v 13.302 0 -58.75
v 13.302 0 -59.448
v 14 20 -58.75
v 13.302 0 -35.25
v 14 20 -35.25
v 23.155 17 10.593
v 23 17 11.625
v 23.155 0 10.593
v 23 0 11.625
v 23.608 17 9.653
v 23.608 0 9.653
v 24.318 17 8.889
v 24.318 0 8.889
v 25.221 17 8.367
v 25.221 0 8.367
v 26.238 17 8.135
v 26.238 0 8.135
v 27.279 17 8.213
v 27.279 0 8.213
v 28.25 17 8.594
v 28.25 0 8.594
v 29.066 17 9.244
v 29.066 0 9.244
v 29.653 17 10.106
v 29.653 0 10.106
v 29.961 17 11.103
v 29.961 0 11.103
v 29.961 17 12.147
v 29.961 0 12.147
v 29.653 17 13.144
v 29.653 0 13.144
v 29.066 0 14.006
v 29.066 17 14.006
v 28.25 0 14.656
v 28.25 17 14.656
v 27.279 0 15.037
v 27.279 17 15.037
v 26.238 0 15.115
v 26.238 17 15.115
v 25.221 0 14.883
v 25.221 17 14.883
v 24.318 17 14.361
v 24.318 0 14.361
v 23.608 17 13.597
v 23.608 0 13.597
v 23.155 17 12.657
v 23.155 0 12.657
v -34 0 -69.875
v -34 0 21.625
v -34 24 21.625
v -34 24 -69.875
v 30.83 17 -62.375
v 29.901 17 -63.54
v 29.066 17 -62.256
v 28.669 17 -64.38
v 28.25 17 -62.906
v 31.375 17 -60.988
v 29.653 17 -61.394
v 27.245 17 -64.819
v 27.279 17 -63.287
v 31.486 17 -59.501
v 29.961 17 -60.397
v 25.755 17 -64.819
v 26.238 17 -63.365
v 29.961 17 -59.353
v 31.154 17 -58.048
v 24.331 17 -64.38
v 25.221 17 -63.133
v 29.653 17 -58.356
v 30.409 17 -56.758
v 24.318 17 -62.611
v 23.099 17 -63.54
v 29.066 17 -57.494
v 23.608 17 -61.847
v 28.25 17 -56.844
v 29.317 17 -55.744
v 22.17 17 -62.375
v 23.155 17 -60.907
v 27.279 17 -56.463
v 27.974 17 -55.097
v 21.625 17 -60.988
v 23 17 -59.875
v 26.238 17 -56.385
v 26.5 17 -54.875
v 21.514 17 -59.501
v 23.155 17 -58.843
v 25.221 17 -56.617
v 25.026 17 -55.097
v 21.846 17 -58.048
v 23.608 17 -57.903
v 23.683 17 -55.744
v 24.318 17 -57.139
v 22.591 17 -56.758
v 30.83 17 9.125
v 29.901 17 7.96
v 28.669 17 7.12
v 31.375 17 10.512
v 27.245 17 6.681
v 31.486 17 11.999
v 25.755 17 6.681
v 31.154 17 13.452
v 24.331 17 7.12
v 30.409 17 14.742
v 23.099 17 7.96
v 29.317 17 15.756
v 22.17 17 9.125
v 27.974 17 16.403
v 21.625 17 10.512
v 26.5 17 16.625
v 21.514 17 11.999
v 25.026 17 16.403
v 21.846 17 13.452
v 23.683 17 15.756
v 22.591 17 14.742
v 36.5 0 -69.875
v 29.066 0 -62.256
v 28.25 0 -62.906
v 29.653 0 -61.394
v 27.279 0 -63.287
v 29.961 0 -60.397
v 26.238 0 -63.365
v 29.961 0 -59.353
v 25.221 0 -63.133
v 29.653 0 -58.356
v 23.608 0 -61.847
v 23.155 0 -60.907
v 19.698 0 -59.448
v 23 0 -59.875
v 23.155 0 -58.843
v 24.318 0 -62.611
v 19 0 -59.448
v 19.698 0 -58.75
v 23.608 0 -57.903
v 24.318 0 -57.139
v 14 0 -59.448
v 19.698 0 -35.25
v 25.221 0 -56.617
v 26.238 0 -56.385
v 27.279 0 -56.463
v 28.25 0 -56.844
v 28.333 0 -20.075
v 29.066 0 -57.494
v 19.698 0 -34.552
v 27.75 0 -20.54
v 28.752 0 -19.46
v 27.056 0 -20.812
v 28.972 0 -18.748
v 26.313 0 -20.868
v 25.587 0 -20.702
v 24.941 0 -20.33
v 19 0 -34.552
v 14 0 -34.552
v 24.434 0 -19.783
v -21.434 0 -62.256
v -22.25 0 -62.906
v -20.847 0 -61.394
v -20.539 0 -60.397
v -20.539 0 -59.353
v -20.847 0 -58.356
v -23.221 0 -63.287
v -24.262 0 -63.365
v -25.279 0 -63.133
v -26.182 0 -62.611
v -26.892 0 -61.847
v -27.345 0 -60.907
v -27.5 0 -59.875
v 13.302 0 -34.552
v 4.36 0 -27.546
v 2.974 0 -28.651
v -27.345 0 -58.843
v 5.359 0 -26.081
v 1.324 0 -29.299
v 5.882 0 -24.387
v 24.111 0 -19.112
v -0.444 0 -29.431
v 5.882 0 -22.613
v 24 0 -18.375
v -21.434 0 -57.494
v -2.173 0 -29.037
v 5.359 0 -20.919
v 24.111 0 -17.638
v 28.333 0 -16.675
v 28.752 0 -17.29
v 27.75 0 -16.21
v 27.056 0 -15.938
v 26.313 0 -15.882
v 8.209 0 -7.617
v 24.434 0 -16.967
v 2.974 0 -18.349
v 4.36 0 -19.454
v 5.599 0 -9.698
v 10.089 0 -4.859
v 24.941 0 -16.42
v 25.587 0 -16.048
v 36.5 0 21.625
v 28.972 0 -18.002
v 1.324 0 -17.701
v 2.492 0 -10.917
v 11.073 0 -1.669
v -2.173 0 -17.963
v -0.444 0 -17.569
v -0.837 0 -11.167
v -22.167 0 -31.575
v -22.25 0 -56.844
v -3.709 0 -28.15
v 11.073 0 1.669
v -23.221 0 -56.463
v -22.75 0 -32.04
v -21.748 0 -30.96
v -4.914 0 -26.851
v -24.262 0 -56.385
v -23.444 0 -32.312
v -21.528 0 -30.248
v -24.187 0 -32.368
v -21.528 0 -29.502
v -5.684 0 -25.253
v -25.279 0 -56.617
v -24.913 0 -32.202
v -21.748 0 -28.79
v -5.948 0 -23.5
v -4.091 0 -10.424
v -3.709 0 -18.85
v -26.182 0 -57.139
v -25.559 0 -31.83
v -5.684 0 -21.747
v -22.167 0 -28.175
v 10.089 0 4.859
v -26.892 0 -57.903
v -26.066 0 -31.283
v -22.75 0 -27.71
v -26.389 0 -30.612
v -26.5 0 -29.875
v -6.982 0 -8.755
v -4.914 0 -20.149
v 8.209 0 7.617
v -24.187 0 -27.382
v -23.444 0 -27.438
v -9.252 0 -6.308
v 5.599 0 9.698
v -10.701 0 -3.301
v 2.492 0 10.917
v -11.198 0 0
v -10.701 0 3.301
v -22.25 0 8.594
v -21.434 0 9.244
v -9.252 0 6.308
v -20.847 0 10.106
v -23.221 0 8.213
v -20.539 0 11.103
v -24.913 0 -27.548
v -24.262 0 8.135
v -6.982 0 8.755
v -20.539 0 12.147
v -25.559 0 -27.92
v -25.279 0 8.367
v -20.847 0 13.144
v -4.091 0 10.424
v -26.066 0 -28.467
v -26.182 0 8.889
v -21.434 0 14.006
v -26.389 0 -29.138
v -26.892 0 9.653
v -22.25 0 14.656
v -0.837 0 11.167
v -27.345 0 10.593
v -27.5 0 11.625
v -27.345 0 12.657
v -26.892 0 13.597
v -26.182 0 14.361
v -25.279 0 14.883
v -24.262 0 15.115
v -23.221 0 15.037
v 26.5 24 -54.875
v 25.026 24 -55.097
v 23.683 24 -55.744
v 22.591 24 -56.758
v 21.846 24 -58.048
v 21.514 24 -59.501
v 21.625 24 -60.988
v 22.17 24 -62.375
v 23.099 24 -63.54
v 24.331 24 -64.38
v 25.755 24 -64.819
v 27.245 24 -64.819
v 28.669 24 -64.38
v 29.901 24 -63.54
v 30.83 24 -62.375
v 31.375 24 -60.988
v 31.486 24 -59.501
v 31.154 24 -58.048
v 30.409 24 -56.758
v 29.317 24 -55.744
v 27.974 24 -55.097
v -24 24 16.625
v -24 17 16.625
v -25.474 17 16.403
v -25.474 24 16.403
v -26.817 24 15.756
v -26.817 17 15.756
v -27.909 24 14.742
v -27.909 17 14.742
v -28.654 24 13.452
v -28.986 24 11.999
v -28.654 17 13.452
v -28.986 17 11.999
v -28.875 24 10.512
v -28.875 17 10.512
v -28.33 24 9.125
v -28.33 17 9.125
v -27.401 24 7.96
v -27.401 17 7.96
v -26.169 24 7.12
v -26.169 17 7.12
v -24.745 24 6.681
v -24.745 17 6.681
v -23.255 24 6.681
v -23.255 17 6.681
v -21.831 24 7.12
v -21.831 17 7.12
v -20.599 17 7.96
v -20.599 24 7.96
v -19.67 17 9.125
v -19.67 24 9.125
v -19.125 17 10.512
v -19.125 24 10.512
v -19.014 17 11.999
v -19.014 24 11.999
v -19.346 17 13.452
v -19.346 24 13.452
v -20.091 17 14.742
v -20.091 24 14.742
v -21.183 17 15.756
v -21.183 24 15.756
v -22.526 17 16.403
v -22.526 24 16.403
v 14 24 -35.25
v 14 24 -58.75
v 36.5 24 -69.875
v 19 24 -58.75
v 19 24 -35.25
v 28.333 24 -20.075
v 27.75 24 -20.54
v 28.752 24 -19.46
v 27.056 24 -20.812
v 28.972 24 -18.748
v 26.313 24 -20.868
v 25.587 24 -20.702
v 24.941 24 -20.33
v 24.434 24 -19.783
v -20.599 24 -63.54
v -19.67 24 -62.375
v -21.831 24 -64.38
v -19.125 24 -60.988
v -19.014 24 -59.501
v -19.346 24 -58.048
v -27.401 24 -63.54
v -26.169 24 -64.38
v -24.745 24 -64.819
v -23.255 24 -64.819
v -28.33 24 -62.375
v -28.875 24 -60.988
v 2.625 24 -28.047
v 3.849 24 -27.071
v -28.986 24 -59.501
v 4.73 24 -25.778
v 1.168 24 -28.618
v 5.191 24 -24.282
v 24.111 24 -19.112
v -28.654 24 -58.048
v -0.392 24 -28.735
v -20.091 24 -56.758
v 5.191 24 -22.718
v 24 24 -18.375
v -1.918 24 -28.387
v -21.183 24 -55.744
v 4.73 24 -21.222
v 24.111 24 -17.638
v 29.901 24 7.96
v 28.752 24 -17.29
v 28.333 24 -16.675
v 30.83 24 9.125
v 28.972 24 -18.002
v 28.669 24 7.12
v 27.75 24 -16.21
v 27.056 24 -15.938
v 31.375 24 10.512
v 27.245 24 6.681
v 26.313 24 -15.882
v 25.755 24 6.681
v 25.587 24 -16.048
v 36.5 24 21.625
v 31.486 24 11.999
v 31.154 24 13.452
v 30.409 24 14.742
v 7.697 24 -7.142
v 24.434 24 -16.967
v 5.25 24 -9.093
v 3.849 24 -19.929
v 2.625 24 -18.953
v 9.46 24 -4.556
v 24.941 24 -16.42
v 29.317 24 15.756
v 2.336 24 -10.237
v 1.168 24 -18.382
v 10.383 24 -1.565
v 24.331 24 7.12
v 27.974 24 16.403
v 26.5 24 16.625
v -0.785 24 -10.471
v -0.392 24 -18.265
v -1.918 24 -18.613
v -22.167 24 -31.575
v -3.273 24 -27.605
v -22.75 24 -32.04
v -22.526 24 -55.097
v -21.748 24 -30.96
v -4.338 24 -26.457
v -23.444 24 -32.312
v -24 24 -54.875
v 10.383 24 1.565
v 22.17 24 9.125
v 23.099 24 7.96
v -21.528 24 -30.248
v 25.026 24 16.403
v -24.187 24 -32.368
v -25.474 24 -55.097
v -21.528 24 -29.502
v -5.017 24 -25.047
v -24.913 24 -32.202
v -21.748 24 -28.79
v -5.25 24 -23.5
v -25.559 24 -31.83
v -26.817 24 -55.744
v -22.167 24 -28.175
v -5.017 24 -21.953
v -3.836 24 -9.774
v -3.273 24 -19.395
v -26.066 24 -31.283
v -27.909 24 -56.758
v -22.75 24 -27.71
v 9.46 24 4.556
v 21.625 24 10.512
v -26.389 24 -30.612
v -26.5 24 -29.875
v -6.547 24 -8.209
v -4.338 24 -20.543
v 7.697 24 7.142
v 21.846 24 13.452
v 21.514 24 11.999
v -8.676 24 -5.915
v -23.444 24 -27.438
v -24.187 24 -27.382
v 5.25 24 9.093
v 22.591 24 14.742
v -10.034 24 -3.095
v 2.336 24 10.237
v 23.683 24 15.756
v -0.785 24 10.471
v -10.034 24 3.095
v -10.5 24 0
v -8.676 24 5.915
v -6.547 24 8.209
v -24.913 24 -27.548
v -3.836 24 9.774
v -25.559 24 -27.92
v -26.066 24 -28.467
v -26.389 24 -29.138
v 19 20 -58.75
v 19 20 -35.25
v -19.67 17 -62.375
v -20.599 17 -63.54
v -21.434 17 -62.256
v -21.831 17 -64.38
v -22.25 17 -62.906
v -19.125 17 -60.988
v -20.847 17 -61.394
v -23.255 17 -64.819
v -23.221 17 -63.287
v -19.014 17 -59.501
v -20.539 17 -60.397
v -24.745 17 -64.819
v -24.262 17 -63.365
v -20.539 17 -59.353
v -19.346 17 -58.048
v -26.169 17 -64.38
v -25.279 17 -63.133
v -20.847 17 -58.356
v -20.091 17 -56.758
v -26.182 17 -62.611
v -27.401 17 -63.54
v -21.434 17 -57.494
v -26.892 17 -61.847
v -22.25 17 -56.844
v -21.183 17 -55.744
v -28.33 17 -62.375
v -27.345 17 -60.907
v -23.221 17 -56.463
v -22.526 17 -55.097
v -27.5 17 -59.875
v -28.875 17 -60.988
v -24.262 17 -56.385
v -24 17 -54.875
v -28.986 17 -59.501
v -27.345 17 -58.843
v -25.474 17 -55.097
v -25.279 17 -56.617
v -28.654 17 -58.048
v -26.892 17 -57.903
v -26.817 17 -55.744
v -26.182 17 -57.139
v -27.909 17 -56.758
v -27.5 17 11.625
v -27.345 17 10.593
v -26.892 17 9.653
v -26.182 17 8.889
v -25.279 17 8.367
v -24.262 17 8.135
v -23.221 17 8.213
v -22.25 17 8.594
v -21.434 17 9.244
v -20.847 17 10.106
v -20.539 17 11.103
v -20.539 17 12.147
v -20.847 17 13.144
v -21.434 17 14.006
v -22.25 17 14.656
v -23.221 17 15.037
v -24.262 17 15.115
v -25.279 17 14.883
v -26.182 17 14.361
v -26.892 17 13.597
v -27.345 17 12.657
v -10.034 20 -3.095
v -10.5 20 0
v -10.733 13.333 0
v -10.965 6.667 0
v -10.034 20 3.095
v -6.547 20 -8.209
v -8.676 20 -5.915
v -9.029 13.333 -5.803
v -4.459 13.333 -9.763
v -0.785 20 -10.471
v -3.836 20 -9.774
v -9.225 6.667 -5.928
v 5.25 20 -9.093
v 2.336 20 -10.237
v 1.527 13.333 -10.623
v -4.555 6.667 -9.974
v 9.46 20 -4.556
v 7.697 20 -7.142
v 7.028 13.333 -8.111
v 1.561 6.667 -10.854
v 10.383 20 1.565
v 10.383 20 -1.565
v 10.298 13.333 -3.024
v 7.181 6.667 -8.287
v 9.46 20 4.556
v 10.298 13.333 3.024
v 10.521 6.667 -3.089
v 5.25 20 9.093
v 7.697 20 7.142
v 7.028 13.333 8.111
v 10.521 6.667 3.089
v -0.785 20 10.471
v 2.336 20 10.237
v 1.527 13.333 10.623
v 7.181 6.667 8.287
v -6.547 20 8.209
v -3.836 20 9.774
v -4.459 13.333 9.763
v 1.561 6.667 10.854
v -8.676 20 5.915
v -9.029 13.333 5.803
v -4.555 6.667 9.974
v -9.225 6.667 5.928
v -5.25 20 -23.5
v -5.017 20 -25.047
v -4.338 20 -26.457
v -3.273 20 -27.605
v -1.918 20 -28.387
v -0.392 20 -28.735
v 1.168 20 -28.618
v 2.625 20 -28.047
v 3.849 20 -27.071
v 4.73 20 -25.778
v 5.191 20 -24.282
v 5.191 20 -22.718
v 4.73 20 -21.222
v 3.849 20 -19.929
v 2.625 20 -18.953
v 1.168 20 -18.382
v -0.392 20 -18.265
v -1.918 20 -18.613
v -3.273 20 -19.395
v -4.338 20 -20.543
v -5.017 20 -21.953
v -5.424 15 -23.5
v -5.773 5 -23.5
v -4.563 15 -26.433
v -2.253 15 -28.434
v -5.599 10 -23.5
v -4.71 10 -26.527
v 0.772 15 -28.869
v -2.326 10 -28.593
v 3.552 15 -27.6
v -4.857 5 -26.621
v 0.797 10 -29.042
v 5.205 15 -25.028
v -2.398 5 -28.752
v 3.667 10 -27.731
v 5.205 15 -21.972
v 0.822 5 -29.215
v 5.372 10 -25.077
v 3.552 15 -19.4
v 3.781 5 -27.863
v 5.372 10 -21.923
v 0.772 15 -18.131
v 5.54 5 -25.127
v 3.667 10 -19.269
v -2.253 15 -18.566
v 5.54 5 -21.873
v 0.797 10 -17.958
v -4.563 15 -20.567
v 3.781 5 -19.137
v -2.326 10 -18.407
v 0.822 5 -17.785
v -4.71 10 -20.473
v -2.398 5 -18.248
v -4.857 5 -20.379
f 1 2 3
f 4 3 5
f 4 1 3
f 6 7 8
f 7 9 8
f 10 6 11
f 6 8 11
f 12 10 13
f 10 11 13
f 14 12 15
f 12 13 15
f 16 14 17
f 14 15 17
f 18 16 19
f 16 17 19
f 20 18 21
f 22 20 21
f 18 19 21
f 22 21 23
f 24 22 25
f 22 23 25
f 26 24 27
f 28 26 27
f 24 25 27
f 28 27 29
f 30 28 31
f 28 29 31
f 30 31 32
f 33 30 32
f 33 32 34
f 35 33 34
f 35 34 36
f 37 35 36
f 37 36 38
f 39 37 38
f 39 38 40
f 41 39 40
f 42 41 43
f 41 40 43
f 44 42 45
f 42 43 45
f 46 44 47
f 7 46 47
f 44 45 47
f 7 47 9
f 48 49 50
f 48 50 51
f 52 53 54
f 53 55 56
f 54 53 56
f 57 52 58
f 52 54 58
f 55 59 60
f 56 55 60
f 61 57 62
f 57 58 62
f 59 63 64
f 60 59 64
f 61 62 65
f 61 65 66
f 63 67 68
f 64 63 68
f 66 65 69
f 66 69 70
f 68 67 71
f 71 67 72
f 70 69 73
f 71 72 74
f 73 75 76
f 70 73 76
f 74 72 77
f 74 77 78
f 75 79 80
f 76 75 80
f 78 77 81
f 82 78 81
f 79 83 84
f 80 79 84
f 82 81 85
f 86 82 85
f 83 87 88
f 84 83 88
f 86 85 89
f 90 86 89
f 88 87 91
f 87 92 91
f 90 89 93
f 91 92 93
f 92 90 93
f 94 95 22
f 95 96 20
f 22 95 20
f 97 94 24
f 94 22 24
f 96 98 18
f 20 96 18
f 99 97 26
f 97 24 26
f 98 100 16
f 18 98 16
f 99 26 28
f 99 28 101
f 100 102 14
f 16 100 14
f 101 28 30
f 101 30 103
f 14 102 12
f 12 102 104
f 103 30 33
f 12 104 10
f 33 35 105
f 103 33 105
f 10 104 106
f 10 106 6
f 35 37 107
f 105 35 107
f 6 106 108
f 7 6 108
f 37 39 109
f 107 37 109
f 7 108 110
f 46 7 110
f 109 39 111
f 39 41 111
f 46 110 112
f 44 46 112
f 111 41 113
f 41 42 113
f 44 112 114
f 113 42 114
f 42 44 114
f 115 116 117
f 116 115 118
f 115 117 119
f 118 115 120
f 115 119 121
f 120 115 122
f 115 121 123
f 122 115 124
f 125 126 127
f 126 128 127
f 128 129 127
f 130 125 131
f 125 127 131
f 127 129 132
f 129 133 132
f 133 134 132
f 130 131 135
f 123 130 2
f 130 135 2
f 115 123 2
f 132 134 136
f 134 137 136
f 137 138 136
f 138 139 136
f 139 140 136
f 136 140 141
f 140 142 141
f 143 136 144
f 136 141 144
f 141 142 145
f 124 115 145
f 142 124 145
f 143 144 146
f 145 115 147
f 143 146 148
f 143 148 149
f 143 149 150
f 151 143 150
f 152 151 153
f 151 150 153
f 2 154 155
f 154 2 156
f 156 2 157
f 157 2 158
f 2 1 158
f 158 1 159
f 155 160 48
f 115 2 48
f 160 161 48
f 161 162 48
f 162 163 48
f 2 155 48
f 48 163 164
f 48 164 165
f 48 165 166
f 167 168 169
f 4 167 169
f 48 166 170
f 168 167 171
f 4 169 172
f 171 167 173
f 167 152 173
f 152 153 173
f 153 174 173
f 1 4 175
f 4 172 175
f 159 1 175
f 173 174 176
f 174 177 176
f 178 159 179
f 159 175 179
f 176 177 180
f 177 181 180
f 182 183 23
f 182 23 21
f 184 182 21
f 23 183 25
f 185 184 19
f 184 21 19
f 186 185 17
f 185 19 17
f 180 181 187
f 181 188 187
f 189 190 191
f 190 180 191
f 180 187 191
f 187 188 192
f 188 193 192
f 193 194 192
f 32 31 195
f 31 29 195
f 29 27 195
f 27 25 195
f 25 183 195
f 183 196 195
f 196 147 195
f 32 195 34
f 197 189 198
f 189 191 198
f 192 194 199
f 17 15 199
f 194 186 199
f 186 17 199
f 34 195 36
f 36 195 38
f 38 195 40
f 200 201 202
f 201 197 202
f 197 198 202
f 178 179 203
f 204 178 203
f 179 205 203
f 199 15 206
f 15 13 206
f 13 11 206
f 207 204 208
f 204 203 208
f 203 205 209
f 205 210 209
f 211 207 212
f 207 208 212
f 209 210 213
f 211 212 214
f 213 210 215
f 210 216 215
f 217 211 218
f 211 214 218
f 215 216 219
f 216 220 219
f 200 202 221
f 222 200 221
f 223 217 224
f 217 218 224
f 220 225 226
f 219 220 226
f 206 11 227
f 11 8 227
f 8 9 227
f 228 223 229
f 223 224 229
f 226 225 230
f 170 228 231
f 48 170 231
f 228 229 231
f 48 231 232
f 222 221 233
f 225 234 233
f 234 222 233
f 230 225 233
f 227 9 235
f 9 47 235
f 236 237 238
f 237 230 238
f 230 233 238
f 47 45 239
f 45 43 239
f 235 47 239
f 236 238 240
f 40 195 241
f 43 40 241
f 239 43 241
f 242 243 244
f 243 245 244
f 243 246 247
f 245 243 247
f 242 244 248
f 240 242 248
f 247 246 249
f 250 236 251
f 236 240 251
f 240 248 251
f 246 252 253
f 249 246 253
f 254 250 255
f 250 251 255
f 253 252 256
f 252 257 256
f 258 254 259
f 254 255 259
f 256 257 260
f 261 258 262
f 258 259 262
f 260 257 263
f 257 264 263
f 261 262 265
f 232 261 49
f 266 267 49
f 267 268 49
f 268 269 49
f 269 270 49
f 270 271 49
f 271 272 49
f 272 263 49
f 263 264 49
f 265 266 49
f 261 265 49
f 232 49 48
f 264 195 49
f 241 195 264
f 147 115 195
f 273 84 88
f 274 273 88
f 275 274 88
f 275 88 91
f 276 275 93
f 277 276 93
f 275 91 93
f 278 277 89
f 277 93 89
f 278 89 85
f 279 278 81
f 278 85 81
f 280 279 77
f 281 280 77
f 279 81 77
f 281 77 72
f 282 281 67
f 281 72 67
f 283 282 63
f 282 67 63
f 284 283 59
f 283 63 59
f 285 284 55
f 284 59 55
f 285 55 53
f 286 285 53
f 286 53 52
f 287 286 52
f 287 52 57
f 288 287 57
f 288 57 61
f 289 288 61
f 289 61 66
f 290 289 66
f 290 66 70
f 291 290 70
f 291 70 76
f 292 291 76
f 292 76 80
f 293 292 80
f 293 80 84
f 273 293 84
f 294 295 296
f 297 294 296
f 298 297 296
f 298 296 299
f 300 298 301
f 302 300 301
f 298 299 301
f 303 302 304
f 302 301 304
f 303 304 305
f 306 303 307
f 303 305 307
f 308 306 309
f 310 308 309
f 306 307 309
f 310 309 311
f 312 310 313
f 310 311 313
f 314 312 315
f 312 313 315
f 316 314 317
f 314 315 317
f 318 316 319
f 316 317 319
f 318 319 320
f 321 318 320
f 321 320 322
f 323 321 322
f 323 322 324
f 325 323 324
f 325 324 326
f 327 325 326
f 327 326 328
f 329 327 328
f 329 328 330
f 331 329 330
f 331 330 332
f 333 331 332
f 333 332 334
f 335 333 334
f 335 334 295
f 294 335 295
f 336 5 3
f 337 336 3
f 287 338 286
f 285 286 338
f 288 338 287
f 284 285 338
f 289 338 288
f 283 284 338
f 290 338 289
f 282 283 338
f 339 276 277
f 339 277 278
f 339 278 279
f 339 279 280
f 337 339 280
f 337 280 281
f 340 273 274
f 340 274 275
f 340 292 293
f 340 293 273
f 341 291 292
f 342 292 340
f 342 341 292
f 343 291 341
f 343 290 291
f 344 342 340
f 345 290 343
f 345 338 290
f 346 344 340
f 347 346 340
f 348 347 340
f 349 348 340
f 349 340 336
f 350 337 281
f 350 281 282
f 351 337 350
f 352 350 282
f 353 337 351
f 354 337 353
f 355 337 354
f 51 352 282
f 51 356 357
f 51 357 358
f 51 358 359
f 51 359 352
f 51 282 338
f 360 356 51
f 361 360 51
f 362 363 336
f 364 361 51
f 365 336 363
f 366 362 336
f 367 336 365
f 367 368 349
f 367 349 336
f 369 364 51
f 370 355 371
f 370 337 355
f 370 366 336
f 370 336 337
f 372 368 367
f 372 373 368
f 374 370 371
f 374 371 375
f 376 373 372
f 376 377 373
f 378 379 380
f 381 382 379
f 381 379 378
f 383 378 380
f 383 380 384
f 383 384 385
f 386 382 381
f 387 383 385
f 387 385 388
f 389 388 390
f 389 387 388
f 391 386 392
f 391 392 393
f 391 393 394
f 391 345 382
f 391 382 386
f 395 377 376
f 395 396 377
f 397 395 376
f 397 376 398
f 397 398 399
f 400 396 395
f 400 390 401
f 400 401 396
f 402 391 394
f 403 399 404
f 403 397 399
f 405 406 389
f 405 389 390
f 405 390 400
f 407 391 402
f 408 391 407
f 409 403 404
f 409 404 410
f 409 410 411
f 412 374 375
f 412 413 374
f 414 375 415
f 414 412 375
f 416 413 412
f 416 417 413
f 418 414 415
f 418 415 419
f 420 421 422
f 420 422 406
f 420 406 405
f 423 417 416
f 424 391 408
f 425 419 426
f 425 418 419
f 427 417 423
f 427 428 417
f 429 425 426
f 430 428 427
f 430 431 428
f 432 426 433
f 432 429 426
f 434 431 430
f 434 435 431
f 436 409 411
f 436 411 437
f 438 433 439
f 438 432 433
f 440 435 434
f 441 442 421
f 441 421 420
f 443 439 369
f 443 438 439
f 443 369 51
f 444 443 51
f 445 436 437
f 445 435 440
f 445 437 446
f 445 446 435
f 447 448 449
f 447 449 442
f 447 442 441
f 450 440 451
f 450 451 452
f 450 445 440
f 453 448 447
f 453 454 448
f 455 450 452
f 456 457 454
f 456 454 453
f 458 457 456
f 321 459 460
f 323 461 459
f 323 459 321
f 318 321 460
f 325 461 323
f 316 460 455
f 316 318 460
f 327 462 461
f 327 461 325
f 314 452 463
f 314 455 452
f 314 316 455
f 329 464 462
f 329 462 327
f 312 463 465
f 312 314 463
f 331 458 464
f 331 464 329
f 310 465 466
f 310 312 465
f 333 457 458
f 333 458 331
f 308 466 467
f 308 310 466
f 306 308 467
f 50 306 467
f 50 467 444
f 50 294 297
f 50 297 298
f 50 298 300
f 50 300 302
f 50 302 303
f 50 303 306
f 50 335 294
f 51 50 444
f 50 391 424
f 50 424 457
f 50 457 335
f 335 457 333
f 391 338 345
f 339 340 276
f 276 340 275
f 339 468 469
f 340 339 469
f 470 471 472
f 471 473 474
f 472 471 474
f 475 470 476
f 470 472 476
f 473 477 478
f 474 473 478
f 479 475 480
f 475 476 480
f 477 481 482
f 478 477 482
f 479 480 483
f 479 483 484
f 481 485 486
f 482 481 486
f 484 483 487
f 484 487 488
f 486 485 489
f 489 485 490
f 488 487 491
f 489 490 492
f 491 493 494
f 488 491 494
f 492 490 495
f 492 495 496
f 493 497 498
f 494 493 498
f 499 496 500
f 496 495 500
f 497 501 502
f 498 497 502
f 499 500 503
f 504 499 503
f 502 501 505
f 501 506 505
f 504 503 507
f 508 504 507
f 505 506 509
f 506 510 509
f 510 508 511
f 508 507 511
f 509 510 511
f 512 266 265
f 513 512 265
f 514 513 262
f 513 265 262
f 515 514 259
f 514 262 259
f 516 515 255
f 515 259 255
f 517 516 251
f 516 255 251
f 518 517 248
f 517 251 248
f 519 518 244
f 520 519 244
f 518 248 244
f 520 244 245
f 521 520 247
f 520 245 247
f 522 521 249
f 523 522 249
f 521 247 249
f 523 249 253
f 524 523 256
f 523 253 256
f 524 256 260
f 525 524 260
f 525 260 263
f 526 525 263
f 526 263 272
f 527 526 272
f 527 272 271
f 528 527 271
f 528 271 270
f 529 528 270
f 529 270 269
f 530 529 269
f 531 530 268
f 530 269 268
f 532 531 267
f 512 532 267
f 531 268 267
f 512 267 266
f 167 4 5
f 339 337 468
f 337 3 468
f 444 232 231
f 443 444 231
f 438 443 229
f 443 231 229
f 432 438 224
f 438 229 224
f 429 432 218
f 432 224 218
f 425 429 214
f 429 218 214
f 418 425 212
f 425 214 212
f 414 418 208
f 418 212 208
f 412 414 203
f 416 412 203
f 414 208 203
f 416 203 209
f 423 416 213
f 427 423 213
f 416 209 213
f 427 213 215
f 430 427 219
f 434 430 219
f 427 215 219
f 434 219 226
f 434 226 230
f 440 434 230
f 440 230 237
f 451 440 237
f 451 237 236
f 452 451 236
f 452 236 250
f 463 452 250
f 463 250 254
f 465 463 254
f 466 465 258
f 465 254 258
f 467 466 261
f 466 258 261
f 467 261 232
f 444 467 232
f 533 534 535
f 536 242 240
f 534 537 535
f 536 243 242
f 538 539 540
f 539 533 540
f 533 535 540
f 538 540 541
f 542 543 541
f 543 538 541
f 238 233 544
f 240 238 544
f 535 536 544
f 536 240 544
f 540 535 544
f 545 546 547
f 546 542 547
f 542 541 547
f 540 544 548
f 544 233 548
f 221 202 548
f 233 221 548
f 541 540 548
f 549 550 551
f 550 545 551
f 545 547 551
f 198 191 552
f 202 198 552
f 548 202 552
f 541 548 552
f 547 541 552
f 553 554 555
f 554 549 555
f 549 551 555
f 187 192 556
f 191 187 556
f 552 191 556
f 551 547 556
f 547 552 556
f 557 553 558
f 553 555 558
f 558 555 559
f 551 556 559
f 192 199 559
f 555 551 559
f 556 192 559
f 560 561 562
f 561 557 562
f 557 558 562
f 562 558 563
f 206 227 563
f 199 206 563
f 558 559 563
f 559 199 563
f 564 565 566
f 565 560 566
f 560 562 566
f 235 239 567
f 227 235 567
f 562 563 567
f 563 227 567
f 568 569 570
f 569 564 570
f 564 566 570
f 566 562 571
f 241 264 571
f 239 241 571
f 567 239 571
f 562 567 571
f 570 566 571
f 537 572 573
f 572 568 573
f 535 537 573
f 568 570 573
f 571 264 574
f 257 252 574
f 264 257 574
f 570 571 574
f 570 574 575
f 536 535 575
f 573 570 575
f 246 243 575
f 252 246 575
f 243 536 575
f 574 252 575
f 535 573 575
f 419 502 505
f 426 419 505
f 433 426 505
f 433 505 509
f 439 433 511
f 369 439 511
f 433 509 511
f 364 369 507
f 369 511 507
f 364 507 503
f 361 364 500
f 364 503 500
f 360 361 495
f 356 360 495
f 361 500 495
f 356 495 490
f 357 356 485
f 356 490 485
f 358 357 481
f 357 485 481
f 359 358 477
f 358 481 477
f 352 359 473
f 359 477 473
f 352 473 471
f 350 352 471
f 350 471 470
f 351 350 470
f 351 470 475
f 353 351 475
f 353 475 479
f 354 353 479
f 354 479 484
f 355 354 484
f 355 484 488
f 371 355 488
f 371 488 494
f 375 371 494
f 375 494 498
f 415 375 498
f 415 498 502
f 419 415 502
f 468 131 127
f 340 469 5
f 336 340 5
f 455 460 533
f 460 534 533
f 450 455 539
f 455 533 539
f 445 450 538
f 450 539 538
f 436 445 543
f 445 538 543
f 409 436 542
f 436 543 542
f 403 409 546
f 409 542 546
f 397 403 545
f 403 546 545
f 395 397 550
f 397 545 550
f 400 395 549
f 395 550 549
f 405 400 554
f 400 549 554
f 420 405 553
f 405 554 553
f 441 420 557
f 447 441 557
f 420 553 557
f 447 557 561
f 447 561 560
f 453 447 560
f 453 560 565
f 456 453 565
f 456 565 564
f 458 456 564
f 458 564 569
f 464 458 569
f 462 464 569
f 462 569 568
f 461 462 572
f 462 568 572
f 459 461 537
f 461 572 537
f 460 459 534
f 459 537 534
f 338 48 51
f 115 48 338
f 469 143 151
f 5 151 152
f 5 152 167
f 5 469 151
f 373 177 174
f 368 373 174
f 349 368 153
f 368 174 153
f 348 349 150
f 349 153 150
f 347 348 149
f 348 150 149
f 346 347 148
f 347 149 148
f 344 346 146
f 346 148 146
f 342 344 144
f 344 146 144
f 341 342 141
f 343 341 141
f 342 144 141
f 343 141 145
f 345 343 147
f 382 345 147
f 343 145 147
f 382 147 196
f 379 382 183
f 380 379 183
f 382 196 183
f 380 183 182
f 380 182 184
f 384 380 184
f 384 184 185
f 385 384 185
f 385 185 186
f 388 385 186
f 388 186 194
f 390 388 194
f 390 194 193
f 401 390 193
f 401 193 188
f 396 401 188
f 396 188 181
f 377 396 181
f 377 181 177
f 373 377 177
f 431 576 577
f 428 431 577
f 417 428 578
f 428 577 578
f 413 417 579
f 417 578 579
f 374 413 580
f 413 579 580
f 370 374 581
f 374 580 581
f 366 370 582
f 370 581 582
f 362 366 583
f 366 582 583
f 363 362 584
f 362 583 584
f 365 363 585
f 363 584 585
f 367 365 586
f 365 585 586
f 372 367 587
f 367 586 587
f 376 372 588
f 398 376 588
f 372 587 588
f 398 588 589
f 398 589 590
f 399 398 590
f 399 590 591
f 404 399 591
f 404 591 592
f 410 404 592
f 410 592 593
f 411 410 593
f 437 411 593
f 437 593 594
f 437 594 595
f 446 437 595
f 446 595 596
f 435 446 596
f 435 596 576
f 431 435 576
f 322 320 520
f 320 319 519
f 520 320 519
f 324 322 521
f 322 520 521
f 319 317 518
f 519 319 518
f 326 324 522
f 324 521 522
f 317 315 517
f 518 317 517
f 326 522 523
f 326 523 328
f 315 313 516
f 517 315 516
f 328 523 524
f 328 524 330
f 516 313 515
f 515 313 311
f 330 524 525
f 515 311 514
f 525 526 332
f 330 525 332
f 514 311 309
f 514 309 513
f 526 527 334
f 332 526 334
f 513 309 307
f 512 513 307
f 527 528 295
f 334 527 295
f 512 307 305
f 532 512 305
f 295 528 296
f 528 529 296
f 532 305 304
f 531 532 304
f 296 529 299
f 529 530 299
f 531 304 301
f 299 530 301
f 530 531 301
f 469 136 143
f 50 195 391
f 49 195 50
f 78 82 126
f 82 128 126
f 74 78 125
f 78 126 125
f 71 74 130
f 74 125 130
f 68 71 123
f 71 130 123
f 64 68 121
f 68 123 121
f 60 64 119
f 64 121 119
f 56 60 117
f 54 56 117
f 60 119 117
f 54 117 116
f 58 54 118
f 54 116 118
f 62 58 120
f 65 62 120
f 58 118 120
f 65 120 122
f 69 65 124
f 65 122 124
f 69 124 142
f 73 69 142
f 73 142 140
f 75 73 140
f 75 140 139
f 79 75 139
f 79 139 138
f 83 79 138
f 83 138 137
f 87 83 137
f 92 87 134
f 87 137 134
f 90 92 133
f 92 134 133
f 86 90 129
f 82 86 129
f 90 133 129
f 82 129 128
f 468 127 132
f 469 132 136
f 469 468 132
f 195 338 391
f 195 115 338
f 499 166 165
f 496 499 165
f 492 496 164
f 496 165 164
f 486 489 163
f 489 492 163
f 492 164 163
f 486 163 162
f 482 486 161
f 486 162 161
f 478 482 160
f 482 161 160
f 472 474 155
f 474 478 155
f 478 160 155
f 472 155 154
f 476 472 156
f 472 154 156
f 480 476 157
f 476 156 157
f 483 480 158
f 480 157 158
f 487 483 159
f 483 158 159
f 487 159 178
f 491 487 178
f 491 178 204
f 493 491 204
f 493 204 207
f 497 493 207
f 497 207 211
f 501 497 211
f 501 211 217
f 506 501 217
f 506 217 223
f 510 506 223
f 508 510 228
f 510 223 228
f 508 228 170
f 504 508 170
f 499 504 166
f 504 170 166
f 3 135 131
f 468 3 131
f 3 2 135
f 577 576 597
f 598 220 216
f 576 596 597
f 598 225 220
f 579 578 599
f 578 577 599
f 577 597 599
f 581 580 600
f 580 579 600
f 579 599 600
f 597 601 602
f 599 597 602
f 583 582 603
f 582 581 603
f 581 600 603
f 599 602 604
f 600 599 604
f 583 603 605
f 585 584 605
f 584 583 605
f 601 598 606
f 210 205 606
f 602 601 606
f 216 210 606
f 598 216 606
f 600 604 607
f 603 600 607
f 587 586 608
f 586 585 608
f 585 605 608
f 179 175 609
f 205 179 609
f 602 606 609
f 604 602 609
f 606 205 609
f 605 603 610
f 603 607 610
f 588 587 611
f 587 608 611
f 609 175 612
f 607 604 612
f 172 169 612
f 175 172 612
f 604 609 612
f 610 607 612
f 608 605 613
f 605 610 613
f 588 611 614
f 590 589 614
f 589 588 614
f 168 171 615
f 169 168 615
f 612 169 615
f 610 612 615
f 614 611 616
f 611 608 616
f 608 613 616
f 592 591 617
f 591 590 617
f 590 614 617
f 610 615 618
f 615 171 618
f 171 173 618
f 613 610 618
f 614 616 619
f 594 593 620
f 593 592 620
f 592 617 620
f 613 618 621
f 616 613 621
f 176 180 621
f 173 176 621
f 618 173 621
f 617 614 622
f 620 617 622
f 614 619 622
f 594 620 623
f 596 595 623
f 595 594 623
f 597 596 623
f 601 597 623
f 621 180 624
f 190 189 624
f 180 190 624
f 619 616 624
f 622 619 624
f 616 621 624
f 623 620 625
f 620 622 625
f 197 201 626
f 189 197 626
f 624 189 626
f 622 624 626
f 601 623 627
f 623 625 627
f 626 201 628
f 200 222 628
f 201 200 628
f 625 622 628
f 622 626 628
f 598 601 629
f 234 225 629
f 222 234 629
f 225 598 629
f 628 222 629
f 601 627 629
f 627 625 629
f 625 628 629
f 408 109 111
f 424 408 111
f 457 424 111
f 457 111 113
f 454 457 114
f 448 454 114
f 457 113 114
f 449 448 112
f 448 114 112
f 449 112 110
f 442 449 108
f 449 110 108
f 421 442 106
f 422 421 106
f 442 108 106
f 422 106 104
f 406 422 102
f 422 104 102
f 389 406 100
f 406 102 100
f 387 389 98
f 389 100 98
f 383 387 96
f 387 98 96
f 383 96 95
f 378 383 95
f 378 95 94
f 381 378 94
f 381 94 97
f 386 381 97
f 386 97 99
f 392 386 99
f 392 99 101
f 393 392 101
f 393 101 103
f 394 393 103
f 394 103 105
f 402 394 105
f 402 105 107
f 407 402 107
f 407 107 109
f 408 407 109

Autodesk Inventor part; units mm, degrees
ref_plane "YZ Plane" through (0, 0, 0) normal (1, 0, 0) x (0, 1, 0)
ref_plane "XZ Plane" through (0, 0, 0) normal (0, 1, 0) x (-1, 0, 0)
ref_plane "XY Plane" through (0, 0, 0) normal (0, 0, 1) x (1, 0, 0)
sketch "Sketch1" plane through (0, 0, 0) normal (0, 1, 0) x (-1, 0, 0)
  circle A0 centre (0, 0) radius 10.5
  line L0 (0, 0) -> (0, -23.5)
  circle A1 centre (0, -23.5) radius 5.25
  line L1 (0, -23.5) -> (0, -35.25)
  line L2 (-14, -35.25) -> (-14, -58.75)
  line L3 (-14, -58.75) -> (-19, -58.75)
  line L4 (-19, -58.75) -> (-19, -35.25)
  line L5 (-36.5, 21.625) -> (34, 21.625)
  line L6 (-36.5, 21.625) -> (34, 21.625) construction
  line L7 (34, 21.625) -> (24, 21.625)
  line L8 (-36.5, 21.625) -> (34, 21.625)
  line L9 (34, 21.625) -> (34, -69.875)
  line L10 (34, -69.875) -> (-36.5, -69.875)
  line L11 (-36.5, -69.875) -> (-36.5, 21.625)
  line L12 (-36.5, 21.625) -> (-36.5, 11.625)
  line L13 (-36.5, 11.625) -> (-26.5, 11.625)
  circle A2 centre (-26.5, 11.625) radius 3.5
  line L14 (34, 21.625) -> (24, 21.625)
  line L15 (24, 21.625) -> (24, 11.625)
  circle A3 centre (24, 11.625) radius 3.5
  line L16 (34, -69.875) -> (24, -69.875)
  line L17 (24, -69.875) -> (24, -59.875)
  circle A4 centre (24, -59.875) radius 3.5
  line L18 (-36.5, -69.875) -> (-26.5, -69.875)
  line L19 (-26.5, -69.875) -> (-26.5, -59.875)
  circle A5 centre (-26.5, -59.875) radius 3.5
  line L20 (-26.5, 11.625) -> (-26.5, -18.375)
  line L21 (24, -59.875) -> (24, -29.875)
  circle A6 centre (-26.5, -18.375) radius 2.5
  circle A7 centre (24, -29.875) radius 2.5
  line L22 (-19, -35.25) -> (-14, -35.25)
  dimension "d0" = 21
  dimension "d1" = 23.5
  dimension "d2" = 10.5
  dimension "d3" = 11.75
  dimension "d5" = 23.5
  dimension "d6" = 5
  dimension "d7" = 23.5
  dimension "d9" = 70.5
  dimension "d40" = 21.625
  dimension "d41" = 70.5
  dimension "d42" = 91.5
  dimension "d43" = 10
  dimension "d44" = 10
  dimension "d45" = 7
  dimension "d46" = 10
  dimension "d47" = 10
  dimension "d48" = 90
  dimension "d50" = 7
  dimension "d51" = 10
  dimension "d52" = 10
  dimension "d53" = 7
  dimension "d54" = 10
  dimension "d55" = 10
  dimension "d56" = 7
  dimension "d60" = 30
  dimension "d61" = 30
  dimension "d62" = 5
  dimension "d63" = 5
  dimension "d64" = 14
  dimension "d121" = 34
extrude "Extrusion1" add sketch "Sketch1" along normal blind 24
hole "Hole1" at (-24, 24, -59.875) direction (0, -1, 0) diameter 3 end through all counterbore diameter 10 counterbore depth 7
hole "Hole2" at (26.5, 24, -59.875) direction (0, -1, 0) diameter 3 end through all counterbore diameter 10 counterbore depth 7
hole "Hole3" at (-24, 24, 11.625) direction (0, -1, 0) diameter 3 end through all counterbore diameter 10 counterbore depth 7
hole "Hole4" at (26.5, 24, 11.625) direction (0, -1, 0) diameter 3 end through all counterbore diameter 10 counterbore depth 7
chamfer "Chamfer1" distance 0.698 distance2 20 1 edges at (10.5, 0, 0) measured on face at (-2.5112, 0, -48.5701)
chamfer "Chamfer2" distance 0.698 distance2 20 1 edges at (5.25, 0, -23.5) measured on face at (-2.5112, 0, -48.5701)
chamfer "Chamfer3" distance 0.698 distance2 20 1 edges at (16.5, 0, -35.25) measured on face at (-2.5393, 0, -48.801)
chamfer "Chamfer4" distance 20 distance2 0.698 1 edges at (14, 0, -47) measured on face at (14, 14.6667, -50.9167)
chamfer "Chamfer5" distance 0.698 distance2 20 1 edges at (19, 0, -47) measured on face at (-2.772, 0, -48.801)
chamfer "Chamfer6" distance 0.698 distance2 20 1 edges at (16.5, 0, -58.75) measured on face at (-2.772, 0, -48.801)
properties part number "Matriz"
